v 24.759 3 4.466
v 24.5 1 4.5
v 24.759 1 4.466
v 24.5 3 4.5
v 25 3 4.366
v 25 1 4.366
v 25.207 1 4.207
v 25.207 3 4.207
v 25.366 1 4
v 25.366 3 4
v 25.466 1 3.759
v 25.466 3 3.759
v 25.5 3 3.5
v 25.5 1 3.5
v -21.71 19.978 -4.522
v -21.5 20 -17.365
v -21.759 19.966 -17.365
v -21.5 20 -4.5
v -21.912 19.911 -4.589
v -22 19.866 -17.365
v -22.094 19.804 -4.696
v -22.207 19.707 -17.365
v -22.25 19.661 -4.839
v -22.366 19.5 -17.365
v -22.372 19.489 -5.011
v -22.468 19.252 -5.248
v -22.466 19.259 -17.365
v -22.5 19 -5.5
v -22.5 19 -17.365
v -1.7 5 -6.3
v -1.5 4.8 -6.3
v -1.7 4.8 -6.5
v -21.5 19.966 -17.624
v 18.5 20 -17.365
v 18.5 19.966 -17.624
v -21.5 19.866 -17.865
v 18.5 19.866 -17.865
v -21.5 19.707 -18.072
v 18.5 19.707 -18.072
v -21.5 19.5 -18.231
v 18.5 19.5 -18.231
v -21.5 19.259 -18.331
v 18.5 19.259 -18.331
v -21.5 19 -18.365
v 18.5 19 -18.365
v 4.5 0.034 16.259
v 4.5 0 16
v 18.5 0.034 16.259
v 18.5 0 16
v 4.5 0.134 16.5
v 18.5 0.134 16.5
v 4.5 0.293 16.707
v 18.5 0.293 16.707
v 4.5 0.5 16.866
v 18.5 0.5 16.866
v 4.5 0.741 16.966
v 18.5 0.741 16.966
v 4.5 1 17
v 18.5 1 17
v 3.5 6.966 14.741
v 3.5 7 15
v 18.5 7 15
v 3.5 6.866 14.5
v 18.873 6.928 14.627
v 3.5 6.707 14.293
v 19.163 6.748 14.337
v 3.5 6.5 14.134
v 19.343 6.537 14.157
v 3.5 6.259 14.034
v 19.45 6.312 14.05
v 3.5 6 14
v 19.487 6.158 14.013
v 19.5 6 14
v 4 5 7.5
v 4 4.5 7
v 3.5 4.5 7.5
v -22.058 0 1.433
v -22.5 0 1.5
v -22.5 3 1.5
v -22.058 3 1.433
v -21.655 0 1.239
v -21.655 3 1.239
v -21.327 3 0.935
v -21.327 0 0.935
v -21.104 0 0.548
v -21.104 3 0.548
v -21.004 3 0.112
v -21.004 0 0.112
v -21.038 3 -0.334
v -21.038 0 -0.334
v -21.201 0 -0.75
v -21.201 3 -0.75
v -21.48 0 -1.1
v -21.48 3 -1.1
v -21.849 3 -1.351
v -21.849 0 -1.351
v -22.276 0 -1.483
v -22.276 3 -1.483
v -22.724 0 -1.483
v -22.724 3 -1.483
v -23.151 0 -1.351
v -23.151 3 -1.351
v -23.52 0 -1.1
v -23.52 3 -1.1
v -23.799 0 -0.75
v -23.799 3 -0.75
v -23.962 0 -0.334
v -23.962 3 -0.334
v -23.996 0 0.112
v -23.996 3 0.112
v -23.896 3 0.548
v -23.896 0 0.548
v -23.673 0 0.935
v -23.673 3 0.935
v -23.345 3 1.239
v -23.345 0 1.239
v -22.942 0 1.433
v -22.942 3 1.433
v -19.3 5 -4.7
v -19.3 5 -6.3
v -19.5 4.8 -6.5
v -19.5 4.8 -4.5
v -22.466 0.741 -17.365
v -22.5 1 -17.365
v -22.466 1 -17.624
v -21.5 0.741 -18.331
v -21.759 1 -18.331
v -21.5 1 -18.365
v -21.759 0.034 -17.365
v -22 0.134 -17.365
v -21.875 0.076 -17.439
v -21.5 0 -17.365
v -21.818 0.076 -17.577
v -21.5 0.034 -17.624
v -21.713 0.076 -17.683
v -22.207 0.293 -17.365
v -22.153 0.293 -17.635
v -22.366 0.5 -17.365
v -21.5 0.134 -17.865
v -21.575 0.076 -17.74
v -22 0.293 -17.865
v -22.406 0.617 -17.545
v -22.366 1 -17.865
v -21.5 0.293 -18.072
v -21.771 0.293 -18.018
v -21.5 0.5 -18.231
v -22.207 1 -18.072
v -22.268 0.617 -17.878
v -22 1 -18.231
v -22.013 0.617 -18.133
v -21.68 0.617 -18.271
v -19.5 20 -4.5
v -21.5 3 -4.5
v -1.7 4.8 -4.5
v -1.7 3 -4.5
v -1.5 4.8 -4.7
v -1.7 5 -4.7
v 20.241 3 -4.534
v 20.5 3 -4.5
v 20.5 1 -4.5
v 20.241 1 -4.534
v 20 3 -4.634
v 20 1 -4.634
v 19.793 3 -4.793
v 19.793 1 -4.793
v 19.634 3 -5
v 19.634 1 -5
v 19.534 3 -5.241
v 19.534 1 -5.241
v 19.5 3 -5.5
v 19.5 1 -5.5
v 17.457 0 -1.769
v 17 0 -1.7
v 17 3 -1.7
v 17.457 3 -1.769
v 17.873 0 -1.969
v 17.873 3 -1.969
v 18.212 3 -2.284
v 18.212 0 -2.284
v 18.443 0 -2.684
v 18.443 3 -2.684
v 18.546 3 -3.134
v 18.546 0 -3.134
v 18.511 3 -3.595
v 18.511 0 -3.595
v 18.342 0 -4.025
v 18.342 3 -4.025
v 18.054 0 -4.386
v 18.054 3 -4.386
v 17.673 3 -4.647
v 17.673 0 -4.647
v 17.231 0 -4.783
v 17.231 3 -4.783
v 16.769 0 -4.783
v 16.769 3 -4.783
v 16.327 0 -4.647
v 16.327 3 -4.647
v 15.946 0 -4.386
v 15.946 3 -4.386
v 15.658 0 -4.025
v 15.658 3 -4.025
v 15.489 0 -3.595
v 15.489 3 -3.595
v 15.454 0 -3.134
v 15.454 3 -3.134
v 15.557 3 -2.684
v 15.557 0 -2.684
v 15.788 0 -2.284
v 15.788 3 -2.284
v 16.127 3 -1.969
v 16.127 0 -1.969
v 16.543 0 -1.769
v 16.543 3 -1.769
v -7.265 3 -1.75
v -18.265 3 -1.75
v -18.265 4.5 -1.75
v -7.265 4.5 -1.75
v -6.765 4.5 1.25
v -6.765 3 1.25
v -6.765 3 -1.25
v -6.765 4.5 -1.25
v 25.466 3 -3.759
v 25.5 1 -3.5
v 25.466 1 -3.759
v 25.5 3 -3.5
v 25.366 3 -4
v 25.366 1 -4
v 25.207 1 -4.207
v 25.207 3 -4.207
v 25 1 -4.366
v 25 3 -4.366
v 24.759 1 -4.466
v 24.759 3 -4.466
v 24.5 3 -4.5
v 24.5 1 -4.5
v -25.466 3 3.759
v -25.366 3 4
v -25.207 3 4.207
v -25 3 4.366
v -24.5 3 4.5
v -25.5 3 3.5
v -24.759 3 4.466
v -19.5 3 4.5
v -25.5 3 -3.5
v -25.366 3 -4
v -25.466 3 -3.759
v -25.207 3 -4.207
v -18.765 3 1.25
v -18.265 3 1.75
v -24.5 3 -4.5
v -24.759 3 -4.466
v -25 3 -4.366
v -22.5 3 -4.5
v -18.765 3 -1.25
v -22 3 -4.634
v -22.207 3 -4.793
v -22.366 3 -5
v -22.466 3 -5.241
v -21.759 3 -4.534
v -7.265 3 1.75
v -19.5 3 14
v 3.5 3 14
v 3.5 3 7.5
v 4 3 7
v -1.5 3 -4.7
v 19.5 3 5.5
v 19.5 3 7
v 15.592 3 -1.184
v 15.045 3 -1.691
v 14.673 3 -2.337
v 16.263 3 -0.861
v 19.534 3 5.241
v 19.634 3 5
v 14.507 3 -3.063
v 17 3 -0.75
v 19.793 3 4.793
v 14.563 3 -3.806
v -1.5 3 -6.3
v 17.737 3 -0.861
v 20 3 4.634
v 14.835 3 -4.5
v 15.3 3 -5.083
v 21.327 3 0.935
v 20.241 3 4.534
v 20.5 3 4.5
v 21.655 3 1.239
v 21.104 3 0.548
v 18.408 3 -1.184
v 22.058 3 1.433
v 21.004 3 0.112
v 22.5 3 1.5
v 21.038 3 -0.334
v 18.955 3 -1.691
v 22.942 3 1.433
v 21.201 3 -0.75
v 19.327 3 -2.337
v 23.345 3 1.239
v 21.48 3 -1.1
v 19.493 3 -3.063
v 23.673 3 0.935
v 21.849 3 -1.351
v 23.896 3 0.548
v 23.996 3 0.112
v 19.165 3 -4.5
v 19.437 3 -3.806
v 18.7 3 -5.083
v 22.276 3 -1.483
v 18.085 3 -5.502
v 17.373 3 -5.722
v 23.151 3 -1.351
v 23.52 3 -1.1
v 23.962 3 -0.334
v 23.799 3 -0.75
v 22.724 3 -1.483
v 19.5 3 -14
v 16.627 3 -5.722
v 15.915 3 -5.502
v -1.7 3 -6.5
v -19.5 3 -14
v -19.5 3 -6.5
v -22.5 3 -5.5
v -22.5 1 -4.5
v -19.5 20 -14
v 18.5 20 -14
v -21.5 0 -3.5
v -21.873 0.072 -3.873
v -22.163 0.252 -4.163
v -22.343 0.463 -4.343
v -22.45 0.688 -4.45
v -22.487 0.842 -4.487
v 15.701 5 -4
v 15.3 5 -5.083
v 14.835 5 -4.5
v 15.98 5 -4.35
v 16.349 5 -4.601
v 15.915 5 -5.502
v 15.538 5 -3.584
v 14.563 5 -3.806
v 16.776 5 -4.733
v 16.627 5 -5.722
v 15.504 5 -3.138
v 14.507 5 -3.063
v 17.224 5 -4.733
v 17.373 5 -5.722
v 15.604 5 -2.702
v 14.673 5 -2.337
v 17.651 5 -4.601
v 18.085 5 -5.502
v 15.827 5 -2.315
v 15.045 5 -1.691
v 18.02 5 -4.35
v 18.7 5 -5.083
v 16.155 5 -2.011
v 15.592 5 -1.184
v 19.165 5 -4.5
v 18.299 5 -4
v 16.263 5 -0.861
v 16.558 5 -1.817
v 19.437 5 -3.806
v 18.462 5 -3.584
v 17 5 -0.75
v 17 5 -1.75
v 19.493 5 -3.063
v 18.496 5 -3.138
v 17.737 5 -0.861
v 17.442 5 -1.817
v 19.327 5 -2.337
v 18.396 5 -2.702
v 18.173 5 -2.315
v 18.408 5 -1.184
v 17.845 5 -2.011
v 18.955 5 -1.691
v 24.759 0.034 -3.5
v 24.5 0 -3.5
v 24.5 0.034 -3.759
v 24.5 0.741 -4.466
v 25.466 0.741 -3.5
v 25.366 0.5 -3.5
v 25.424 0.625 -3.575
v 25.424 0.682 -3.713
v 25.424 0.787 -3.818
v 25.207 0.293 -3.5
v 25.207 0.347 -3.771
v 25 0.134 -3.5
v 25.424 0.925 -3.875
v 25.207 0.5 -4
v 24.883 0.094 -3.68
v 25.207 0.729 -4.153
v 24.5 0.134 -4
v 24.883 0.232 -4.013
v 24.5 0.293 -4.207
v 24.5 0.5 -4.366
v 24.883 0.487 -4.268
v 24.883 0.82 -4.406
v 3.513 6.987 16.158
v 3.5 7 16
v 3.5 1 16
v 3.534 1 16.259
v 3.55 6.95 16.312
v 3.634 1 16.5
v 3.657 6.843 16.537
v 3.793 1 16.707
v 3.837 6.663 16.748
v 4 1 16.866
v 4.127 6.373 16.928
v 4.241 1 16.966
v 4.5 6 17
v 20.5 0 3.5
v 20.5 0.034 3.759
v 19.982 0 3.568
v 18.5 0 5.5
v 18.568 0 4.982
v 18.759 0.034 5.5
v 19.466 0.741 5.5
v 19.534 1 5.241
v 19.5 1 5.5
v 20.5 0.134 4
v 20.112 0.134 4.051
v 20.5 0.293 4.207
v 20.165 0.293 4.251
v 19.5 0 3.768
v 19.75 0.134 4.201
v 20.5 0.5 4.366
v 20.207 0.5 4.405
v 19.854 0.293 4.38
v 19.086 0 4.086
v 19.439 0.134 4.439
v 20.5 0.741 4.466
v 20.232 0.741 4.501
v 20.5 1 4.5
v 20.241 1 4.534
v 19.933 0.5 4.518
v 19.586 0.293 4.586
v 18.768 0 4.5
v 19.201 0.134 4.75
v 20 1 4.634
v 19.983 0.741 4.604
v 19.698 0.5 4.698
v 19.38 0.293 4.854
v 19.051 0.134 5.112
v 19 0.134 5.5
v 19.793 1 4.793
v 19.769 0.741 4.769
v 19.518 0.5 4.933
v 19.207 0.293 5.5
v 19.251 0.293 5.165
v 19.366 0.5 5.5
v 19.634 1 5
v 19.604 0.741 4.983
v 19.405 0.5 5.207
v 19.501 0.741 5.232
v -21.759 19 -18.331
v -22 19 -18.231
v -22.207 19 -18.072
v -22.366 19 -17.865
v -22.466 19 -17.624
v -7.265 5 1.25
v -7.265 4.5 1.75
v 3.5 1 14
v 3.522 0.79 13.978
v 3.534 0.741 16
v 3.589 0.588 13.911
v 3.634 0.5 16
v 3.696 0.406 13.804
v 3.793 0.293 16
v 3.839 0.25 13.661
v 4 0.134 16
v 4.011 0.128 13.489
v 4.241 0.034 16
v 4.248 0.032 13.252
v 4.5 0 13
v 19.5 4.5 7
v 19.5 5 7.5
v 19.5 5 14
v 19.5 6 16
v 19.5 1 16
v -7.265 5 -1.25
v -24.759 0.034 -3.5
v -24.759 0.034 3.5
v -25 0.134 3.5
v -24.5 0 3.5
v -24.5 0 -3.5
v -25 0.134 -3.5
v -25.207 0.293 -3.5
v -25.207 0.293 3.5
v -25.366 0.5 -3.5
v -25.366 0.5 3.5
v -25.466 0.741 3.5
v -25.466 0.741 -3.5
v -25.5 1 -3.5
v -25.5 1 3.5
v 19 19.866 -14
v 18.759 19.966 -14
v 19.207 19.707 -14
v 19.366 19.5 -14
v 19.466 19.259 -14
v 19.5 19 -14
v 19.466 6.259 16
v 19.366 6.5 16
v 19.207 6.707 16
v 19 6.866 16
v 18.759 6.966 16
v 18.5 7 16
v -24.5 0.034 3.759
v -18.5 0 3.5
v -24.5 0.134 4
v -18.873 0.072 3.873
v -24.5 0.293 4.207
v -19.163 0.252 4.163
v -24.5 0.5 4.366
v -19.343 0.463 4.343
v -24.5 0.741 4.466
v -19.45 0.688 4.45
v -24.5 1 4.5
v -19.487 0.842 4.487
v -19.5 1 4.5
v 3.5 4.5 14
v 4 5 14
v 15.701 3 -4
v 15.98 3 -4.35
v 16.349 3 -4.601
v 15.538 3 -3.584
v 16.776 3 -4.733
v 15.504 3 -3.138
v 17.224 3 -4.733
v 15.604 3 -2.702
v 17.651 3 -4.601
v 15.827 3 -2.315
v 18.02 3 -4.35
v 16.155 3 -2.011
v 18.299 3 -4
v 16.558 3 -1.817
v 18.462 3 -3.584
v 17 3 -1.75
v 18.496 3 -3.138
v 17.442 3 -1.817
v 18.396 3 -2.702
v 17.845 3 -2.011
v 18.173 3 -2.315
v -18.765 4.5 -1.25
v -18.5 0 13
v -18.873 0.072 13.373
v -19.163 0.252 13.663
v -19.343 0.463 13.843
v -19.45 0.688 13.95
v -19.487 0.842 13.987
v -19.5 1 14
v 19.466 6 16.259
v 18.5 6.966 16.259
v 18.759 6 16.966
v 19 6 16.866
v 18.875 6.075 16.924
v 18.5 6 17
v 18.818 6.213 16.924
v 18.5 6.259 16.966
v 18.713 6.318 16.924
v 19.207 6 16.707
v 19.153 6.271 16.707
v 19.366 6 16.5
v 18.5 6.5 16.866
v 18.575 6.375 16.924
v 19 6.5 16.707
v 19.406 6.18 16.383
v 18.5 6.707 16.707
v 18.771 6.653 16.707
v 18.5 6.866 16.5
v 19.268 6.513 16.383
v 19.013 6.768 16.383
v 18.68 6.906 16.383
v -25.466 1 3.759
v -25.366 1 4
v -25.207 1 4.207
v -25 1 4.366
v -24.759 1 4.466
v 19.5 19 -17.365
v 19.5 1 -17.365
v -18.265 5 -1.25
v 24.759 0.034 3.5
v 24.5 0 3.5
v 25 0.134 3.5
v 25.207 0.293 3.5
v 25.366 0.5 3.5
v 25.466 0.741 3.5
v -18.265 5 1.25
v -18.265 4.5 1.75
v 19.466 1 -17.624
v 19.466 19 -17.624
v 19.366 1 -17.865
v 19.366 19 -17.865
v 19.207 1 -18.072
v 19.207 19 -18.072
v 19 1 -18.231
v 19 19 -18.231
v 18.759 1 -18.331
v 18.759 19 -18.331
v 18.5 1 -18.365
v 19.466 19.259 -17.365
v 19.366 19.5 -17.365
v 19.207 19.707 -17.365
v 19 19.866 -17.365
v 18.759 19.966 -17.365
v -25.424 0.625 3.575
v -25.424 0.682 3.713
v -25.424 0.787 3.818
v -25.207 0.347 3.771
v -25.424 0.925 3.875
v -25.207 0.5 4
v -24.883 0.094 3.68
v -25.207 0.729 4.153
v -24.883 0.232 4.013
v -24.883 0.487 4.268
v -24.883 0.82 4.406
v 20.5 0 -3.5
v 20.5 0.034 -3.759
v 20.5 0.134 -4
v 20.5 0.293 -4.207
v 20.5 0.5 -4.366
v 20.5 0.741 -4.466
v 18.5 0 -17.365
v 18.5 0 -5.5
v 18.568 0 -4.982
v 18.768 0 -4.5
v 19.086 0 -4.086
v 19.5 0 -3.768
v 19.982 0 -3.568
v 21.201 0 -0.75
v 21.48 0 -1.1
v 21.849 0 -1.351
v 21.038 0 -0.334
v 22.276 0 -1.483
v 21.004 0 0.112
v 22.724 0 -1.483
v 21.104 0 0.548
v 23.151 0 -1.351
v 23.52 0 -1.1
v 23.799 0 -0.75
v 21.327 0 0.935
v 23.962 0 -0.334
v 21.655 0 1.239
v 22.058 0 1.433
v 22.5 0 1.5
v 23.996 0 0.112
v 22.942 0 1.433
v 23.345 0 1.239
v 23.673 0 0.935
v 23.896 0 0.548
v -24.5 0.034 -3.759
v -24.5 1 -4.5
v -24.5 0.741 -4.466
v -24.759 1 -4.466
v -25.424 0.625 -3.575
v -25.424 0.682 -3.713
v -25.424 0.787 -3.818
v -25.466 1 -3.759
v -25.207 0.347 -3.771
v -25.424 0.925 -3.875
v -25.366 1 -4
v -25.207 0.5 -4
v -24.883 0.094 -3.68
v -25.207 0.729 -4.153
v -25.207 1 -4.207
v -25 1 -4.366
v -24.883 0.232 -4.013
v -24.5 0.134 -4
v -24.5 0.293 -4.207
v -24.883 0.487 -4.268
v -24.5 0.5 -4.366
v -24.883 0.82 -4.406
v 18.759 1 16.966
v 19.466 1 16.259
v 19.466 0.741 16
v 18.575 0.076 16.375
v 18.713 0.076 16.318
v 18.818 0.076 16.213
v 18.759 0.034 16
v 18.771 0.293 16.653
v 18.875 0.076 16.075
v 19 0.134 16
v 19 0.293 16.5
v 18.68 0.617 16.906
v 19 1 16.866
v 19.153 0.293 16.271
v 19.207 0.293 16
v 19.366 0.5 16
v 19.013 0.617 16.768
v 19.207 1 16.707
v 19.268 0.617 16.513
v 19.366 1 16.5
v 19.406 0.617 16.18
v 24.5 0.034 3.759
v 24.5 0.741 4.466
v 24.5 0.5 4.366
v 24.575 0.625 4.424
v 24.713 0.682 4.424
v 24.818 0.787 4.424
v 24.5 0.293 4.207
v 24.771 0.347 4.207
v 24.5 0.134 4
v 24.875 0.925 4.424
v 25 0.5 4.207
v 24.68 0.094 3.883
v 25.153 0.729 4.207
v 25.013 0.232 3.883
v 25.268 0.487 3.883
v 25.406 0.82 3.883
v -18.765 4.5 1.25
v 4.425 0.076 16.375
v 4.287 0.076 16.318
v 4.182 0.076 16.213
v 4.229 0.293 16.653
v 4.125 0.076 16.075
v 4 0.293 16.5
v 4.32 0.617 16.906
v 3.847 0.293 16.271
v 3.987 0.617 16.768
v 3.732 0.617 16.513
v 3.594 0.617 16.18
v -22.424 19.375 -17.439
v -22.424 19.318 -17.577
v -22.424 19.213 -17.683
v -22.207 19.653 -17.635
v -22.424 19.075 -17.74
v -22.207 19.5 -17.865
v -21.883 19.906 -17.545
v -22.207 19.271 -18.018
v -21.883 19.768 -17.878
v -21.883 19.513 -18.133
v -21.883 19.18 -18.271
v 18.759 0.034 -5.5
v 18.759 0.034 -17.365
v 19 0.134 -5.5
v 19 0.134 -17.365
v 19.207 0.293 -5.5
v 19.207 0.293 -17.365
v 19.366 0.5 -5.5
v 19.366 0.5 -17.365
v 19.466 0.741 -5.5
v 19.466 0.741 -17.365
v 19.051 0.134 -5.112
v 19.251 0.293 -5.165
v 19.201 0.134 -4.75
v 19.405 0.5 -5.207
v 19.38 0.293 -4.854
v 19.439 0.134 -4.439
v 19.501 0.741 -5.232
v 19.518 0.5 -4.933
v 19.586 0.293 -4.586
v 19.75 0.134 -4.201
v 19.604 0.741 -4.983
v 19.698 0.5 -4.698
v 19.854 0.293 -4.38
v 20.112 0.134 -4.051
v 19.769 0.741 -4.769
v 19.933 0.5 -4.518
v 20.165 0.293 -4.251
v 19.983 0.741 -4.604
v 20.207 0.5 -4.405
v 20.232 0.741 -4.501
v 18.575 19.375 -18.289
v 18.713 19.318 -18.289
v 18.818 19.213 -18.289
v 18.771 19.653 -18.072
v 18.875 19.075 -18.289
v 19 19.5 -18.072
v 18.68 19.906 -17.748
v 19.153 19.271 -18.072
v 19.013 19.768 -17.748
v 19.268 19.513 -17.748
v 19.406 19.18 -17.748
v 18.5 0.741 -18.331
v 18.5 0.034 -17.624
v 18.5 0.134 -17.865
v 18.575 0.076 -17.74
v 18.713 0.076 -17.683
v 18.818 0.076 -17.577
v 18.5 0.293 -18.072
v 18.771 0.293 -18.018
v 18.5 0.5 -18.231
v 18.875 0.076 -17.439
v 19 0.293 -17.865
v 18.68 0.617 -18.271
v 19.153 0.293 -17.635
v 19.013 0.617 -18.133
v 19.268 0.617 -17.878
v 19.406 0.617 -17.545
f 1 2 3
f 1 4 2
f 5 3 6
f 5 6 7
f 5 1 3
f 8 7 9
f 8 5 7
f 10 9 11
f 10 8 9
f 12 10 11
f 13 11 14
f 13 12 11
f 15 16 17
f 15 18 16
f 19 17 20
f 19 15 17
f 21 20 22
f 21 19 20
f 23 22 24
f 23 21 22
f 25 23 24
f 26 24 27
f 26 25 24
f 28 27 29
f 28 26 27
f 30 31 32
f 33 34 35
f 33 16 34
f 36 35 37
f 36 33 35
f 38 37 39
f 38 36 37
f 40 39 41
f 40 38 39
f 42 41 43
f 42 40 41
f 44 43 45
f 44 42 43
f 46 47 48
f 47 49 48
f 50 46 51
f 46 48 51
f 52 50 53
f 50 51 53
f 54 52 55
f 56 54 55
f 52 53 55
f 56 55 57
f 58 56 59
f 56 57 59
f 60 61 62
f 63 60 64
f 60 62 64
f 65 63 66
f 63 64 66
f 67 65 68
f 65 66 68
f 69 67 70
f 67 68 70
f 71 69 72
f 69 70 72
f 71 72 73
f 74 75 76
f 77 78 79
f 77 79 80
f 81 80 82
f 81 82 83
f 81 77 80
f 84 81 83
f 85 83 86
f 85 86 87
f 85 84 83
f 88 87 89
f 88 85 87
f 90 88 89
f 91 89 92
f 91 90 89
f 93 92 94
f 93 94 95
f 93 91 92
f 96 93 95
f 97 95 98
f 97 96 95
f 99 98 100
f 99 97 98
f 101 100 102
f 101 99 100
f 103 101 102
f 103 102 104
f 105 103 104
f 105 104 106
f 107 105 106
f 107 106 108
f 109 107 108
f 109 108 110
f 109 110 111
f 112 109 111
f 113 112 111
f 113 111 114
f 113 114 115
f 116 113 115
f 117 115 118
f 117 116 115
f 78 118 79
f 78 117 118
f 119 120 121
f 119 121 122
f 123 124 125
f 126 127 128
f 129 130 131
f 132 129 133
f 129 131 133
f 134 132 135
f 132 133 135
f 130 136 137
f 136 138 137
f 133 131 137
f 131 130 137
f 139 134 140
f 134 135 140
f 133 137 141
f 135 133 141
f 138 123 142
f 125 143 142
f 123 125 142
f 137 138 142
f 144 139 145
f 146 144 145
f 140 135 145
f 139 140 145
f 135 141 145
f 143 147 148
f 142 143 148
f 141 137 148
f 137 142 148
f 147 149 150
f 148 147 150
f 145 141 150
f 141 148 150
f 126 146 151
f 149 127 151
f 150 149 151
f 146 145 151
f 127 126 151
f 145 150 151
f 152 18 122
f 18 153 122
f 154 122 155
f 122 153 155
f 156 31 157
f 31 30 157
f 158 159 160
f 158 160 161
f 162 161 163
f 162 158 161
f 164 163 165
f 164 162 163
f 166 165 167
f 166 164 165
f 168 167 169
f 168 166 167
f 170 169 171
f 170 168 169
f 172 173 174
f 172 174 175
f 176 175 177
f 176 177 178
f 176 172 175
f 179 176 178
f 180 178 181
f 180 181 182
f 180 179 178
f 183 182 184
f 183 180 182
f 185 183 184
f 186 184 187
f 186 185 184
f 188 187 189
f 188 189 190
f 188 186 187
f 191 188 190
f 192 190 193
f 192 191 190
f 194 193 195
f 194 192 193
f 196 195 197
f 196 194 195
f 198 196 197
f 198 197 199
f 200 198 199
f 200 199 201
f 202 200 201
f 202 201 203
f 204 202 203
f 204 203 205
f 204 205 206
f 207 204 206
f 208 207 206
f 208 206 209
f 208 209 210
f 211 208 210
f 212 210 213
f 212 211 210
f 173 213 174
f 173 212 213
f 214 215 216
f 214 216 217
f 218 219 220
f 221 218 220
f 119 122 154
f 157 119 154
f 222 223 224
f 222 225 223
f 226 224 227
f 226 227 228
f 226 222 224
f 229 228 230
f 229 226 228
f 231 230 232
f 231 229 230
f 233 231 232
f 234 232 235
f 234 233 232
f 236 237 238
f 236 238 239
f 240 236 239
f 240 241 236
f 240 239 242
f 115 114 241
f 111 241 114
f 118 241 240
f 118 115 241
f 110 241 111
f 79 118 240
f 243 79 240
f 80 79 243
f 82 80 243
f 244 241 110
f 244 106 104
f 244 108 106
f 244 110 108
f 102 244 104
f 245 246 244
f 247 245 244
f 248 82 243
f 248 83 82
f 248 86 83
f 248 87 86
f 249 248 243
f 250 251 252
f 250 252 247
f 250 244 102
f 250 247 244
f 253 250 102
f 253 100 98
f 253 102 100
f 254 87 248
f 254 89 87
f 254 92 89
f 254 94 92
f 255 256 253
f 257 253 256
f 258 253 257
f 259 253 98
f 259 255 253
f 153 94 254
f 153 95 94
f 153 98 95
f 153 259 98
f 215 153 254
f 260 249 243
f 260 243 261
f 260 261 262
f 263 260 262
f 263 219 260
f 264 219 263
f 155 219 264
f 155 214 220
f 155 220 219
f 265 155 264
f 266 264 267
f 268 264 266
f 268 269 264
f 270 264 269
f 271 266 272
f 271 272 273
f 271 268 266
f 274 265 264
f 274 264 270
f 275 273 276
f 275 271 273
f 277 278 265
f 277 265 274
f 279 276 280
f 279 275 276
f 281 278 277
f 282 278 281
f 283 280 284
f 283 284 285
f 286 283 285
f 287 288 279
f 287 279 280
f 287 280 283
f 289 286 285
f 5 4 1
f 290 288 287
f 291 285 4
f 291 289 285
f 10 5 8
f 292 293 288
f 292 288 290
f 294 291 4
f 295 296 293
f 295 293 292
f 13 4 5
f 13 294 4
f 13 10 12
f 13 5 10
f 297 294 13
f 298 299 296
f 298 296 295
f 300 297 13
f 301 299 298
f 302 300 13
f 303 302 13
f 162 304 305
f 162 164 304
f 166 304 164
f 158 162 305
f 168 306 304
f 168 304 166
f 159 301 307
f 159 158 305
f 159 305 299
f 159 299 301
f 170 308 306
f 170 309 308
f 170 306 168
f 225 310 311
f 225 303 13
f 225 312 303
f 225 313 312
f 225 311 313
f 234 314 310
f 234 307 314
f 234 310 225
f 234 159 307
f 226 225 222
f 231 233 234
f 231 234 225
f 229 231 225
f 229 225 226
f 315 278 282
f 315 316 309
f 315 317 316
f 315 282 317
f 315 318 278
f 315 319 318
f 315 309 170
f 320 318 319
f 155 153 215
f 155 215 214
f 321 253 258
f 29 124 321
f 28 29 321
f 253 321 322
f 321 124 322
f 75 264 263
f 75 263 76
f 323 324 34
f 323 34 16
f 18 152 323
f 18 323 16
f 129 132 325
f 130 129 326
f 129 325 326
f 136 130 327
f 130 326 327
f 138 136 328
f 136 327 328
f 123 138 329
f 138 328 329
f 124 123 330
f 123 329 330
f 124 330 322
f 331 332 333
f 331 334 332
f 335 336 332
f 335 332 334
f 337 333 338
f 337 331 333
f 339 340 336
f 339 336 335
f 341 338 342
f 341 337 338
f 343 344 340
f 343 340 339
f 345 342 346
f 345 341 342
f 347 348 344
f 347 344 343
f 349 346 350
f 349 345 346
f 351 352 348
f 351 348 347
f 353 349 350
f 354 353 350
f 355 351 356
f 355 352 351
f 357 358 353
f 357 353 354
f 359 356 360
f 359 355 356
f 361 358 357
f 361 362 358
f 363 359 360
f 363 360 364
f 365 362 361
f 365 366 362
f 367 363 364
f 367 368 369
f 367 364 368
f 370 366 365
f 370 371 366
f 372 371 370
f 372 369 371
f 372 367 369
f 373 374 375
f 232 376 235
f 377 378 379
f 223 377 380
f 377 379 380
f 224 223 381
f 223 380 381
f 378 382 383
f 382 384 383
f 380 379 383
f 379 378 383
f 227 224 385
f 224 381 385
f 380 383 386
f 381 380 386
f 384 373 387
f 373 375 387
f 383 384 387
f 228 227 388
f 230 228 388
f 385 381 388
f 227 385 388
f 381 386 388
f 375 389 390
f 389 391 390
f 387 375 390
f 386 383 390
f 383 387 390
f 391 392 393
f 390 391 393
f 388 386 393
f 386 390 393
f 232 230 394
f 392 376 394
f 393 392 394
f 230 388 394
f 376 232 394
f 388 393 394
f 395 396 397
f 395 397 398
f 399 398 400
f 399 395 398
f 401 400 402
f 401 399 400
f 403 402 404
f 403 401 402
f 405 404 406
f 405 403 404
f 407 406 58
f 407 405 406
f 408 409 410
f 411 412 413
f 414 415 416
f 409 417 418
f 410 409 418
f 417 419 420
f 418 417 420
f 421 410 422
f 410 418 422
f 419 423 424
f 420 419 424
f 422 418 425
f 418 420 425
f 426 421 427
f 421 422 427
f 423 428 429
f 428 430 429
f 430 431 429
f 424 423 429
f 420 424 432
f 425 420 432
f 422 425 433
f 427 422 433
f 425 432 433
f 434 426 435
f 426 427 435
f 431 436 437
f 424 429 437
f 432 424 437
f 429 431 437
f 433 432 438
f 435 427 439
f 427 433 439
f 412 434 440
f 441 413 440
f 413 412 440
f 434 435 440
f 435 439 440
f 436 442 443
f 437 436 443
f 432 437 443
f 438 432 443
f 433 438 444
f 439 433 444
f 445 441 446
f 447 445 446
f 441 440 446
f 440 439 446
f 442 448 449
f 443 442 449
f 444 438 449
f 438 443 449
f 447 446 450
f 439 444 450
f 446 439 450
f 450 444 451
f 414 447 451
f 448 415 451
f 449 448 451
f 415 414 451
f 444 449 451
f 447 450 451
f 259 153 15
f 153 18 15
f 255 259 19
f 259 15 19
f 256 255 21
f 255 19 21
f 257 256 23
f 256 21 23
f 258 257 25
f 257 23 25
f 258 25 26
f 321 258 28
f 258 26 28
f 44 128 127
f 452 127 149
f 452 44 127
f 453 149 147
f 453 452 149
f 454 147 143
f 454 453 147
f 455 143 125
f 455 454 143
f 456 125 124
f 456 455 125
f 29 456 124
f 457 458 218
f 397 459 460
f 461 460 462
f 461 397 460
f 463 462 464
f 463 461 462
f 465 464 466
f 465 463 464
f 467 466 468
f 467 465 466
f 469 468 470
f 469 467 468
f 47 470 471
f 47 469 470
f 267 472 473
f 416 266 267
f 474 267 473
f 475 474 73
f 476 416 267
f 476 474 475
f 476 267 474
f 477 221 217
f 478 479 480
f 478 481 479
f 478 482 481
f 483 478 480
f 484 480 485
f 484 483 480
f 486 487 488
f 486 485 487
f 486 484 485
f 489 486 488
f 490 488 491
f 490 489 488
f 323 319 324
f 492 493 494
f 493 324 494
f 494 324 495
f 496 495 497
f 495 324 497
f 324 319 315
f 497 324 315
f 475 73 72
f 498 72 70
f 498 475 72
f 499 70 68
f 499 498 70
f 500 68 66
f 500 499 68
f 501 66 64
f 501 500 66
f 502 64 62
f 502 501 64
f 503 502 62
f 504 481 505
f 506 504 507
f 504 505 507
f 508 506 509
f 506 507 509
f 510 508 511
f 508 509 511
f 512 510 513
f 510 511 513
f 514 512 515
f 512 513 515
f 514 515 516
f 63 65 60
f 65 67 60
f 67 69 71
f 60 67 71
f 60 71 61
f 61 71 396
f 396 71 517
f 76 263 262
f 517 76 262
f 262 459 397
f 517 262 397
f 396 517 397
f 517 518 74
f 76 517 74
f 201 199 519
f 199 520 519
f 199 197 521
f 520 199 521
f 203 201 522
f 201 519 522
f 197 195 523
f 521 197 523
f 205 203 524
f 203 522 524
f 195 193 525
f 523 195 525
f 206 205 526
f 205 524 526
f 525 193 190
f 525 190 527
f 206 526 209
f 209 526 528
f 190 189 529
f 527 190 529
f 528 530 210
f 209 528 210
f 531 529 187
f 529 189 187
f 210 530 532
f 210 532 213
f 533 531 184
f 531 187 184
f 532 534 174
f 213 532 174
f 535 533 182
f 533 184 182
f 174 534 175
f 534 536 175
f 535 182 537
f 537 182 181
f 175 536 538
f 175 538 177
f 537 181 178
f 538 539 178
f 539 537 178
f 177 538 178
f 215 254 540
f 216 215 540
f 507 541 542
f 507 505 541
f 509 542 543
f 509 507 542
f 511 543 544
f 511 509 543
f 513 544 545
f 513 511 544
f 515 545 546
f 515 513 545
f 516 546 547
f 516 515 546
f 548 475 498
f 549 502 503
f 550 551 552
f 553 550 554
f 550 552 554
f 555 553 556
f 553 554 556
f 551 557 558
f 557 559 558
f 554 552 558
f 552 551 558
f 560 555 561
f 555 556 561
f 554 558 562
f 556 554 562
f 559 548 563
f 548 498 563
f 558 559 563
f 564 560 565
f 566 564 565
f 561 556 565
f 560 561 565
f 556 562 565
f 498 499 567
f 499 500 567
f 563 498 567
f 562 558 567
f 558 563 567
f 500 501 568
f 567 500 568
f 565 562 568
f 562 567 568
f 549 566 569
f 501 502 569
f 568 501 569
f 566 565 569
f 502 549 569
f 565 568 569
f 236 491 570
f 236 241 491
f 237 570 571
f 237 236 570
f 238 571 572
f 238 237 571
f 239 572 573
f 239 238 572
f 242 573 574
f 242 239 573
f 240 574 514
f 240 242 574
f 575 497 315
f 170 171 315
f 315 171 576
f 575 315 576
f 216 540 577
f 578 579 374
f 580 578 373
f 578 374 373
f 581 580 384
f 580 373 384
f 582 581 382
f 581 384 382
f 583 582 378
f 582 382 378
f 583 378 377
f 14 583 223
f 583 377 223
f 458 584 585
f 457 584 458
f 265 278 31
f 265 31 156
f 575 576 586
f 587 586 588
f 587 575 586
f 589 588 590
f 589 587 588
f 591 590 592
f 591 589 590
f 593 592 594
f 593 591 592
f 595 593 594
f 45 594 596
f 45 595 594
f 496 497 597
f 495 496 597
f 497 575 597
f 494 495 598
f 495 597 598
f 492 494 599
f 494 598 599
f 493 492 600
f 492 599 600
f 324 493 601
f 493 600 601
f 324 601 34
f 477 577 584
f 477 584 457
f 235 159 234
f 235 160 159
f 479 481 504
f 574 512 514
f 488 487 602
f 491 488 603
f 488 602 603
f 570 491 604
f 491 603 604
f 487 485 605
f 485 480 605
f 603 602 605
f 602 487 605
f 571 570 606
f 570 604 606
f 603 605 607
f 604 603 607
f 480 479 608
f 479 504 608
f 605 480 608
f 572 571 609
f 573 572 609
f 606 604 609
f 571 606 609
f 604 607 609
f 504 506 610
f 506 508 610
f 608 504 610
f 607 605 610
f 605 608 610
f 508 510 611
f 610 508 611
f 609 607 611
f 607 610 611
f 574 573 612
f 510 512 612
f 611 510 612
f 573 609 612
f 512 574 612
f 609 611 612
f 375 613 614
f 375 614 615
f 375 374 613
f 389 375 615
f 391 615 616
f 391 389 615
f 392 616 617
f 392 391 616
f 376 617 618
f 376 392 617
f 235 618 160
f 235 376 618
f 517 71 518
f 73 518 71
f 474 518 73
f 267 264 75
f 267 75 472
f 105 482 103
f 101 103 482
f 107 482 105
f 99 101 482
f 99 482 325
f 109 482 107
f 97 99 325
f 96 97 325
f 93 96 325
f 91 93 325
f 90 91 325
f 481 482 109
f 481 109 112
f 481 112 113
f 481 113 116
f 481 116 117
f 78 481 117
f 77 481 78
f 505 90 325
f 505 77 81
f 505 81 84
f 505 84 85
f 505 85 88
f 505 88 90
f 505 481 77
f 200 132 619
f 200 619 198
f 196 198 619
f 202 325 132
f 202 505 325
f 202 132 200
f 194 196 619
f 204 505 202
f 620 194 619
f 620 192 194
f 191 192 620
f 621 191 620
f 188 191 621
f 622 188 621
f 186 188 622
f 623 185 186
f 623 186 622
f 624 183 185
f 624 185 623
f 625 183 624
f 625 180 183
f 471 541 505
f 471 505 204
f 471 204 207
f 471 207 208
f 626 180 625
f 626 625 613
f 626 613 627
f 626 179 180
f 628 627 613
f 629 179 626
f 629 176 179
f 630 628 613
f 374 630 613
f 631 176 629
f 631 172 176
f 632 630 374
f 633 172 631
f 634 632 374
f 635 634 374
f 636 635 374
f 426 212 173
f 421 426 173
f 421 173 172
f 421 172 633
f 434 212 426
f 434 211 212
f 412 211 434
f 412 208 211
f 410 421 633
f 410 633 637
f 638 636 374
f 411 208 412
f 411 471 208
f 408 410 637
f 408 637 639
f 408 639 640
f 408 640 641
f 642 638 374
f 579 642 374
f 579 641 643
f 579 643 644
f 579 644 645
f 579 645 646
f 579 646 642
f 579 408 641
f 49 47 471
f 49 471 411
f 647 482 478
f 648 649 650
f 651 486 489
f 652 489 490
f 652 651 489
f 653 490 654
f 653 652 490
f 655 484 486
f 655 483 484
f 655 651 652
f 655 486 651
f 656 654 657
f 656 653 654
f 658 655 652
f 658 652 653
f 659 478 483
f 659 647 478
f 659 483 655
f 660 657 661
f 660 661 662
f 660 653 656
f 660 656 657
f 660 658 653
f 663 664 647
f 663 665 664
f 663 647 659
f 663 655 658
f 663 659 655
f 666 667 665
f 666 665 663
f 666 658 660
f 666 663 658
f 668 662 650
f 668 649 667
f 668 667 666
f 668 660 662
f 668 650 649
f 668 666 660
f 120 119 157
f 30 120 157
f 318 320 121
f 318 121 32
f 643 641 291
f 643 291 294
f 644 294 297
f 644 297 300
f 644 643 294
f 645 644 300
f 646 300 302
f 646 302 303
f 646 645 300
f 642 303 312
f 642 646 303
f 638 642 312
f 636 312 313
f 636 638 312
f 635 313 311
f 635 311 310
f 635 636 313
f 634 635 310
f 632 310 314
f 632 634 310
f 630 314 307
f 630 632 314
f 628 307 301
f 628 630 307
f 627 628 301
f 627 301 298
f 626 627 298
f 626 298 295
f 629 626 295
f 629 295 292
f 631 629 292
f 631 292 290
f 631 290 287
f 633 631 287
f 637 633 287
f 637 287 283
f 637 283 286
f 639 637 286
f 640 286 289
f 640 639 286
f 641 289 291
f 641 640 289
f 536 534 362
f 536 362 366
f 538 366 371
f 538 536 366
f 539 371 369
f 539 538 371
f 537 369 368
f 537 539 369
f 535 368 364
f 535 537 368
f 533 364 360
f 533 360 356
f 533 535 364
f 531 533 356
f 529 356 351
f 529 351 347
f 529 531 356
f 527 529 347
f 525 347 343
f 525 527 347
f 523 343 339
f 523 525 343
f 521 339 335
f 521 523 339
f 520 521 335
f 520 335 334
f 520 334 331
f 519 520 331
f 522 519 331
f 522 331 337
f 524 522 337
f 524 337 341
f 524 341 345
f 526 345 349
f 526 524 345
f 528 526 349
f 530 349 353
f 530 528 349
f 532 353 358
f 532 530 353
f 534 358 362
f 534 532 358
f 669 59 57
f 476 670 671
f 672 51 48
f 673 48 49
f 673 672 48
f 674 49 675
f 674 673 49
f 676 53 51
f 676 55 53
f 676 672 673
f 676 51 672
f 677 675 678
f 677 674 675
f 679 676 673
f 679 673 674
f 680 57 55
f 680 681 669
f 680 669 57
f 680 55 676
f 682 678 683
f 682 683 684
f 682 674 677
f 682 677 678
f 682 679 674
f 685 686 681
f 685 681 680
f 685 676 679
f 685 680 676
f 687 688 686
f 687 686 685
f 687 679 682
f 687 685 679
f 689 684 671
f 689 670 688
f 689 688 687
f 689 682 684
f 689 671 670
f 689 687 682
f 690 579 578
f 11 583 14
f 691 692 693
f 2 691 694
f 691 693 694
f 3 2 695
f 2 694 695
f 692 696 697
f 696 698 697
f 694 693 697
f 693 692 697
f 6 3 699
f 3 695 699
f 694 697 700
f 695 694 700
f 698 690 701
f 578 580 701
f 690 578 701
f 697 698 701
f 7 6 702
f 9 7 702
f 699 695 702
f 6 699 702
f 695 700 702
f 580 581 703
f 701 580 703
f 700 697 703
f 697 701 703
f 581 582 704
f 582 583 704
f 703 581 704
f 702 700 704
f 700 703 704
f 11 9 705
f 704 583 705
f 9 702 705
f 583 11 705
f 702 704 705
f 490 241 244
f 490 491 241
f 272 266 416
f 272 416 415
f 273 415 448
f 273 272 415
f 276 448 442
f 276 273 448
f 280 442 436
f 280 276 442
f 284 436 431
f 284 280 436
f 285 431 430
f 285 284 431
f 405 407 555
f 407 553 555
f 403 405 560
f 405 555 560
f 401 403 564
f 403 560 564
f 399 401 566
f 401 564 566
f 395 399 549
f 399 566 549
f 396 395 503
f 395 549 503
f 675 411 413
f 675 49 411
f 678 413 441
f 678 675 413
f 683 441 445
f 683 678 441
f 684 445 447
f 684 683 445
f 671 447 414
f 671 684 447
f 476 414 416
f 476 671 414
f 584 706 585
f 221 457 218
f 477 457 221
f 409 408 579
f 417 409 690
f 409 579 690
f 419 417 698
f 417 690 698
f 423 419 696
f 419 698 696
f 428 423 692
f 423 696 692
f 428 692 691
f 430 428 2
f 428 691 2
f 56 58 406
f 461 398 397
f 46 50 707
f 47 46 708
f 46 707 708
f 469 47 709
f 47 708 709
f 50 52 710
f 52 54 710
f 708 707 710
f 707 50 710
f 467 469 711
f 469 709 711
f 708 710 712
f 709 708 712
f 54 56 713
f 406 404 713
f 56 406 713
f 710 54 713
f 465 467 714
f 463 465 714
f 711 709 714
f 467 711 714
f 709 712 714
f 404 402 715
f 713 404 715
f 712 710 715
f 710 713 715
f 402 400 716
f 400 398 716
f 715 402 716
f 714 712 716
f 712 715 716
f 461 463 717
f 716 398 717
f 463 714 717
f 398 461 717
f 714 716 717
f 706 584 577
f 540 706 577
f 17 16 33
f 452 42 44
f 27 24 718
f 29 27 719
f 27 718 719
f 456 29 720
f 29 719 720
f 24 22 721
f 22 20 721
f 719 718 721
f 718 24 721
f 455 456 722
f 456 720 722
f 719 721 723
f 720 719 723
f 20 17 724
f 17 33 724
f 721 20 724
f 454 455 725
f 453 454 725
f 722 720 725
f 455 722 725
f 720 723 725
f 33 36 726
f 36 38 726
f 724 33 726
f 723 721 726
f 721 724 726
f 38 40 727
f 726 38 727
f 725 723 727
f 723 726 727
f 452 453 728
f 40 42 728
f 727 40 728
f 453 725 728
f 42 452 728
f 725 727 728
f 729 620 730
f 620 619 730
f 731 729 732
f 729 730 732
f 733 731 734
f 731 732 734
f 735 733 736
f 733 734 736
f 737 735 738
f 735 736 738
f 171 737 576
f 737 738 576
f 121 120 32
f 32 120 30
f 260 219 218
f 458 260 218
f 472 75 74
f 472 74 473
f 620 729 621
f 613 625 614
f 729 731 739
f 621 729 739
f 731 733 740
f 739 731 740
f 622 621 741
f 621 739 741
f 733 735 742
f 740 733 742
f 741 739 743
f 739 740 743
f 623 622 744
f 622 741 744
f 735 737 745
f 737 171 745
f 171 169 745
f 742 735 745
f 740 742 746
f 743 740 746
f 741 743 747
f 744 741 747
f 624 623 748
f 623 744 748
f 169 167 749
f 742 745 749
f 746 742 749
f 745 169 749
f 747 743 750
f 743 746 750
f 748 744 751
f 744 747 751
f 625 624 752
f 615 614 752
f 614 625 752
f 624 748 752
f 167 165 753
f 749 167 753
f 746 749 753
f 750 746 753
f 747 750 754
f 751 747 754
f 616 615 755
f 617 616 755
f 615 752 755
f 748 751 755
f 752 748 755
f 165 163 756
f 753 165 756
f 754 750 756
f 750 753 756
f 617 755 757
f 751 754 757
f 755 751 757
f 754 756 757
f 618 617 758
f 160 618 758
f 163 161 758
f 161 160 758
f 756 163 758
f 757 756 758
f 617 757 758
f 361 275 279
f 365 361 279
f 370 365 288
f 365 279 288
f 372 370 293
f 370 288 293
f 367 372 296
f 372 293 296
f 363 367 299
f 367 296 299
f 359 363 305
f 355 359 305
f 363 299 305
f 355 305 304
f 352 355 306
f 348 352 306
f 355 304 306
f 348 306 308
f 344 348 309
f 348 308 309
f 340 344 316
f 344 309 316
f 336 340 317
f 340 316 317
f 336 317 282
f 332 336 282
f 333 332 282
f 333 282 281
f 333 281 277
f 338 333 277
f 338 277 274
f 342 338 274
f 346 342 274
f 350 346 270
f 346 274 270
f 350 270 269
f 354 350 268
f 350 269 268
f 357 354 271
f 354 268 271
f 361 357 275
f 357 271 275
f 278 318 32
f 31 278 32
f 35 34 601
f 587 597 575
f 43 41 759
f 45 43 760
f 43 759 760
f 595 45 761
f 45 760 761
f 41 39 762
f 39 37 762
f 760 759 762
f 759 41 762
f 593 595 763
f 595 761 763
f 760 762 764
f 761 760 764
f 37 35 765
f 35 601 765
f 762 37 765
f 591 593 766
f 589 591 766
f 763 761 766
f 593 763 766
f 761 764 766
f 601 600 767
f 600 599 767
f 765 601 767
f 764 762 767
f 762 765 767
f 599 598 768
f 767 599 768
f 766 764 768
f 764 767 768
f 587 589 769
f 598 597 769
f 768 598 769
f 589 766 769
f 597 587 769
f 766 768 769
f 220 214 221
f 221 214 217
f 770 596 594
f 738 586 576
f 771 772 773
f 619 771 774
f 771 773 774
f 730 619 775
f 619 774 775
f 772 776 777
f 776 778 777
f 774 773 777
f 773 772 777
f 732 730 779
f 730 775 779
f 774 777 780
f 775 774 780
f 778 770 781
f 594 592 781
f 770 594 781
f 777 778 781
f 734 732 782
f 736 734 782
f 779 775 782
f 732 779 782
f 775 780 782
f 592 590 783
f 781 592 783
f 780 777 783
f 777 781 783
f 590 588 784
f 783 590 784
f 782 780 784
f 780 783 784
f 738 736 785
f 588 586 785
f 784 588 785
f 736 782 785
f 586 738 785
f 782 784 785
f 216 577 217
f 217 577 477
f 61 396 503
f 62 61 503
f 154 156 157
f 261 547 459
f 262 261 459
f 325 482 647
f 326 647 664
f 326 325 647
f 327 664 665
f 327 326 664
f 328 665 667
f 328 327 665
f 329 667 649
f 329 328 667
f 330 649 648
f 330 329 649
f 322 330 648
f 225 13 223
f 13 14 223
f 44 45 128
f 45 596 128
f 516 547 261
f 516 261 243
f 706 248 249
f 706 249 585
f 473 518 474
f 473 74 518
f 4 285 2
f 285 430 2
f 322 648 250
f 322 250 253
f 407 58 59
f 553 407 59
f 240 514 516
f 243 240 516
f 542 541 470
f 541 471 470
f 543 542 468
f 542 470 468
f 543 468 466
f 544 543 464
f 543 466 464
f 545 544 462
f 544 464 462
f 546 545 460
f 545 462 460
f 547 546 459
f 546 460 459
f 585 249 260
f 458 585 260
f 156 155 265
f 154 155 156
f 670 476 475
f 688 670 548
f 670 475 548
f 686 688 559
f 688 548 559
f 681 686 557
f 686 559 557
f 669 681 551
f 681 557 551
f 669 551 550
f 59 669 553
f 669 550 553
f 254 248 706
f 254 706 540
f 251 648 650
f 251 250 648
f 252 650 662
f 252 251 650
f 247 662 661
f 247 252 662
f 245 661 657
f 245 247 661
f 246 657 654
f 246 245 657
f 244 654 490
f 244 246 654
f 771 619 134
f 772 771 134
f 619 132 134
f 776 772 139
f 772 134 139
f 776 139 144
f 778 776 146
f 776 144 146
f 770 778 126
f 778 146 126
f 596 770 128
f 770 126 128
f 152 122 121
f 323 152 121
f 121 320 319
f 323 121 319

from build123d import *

# Parameters (mm, degrees)
ESQUISSE1_W         = 6
ESQUISSE1_H         = 9
ESQUISSE1_R         = 1.5
ESQUISSE1_W_2       = 39
ESQUISSE1_H_2       = 28
ESQUISSE1_R_2       = 1.55
BOSS_EXTRU_2_DEPTH  = 3
ESQUISSE2_W         = 12
ESQUISSE2_H         = 3.5
BOSS_EXTRU_3_DEPTH  = 2
CHANFREIN1_SIZE     = 0.5
ESQUISSE7_R         = 2.5
ESQUISSE7_R_2       = 1.5
BOSS_EXTRU_6_DEPTH  = 2
ESQUISSE5_W         = 18
ESQUISSE5_H         = 2
BOSS_EXTRU_7_DEPTH  = 5
CHANFREIN2_SIZE     = 0.2
ESQUISSE8_W         = 16
ESQUISSE8_H         = 7
BOSS_EXTRU_8_DEPTH  = 2
CHANFREIN3_SIZE     = 0.5
BOSS_EXTRU_9_DEPTH  = 20
ESQUISSE11_W        = 16
ESQUISSE11_H        = 3
BOSS_EXTRU_10_DEPTH = 7
CONG_1_R            = 1


with BuildPart() as part:
    # Esquisse1 → Boss.-Extru.2 (new body)
    # profile 1 of 3: a face of its own
    with BuildSketch(Plane(origin=(0, 0, 0), x_dir=(1, 0, 0), z_dir=(0, 1, 0))):
        with Locations((-22.5, 0)):
            Rectangle(ESQUISSE1_W, ESQUISSE1_H)
        with Locations(Location((-22.5, 0, 0), (0, 0, 270))):
            Circle(ESQUISSE1_R, mode=Mode.SUBTRACT)
    # profile 2 of 3: a face of its own
    with BuildSketch(Plane(origin=(0, 0, 0), x_dir=(1, 0, 0), z_dir=(0, 1, 0))):
        Rectangle(ESQUISSE1_W_2, ESQUISSE1_H_2)
        with Locations(Location((17, 3.25, 0), (0, 0, 270))):
            Circle(ESQUISSE1_R_2, mode=Mode.SUBTRACT)
    # profile 3 of 3: a face of its own
    with BuildSketch(Plane(origin=(0, 0, 0), x_dir=(1, 0, 0), z_dir=(0, 1, 0))):
        with Locations((22.5, 0)):
            Rectangle(ESQUISSE1_W, ESQUISSE1_H)
        with Locations(Location((22.5, 0, 0), (0, 0, 270))):
            Circle(ESQUISSE1_R, mode=Mode.SUBTRACT)
    extrude(amount=BOSS_EXTRU_2_DEPTH)

    # Esquisse2 → Boss.-Extru.3 (add)
    with BuildSketch(Plane(origin=(0, 3, 0), x_dir=(1, 0, 0), z_dir=(0, 1, 0))):
        with Locations((-12.765224295, 0)):
            Rectangle(ESQUISSE2_W, ESQUISSE2_H)
    extrude(amount=BOSS_EXTRU_3_DEPTH)

    # Chanfrein1
    chanfrein1_edges = [part.edges().sort_by_distance(p)[0] for p in [
        (-18.765224295, 4, -1.75),
        (-18.765224295, 4, 1.75),
        (-6.765224295, 4, 1.75),
        (-6.765224295, 4, -1.75),
        (-18.765224295, 5, 0),
        (-12.765224295, 5, 1.75),
        (-6.765224295, 5, 0),
        (-12.765224295, 5, -1.75),
    ]]
    chamfer(chanfrein1_edges, length=CHANFREIN1_SIZE)

    # Esquisse7 → Boss.-Extru.6 (add)
    with BuildSketch(Plane(origin=(0, 3, 0), x_dir=(1, 0, 0), z_dir=(0, 1, 0))):
        with Locations(Location((17, 3.25, 0), (0, 0, 270))):
            Circle(ESQUISSE7_R)
        with Locations(Location((17, 3.25, 0), (0, 0, 270))):
            Circle(ESQUISSE7_R_2, mode=Mode.SUBTRACT)
    extrude(amount=BOSS_EXTRU_6_DEPTH)

    # Esquisse5 → Boss.-Extru.7 (add)
    with BuildSketch(Plane.XZ):
        with Locations((-10.5, -5.5)):
            Rectangle(ESQUISSE5_W, ESQUISSE5_H)
    extrude(amount=-BOSS_EXTRU_7_DEPTH)

    # Chanfrein2
    chanfrein2_edges = [part.edges().sort_by_distance(p)[0] for p in [
        (-1.5, 4, -4.5),
        (-1.5, 5, -5.5),
        (-1.5, 4, -6.5),
        (-10.5, 5, -6.5),
        (-19.5, 5, -5.5),
        (-10.5, 5, -4.5),
    ]]
    chamfer(chanfrein2_edges, length=CHANFREIN2_SIZE)

    # Esquisse8 → Boss.-Extru.8 (add)
    with BuildSketch(Plane(origin=(0, 3, 0), x_dir=(1, 0, 0), z_dir=(0, 1, 0))):
        with Locations((11.5, -10.5)):
            Rectangle(ESQUISSE8_W, ESQUISSE8_H)
    extrude(amount=BOSS_EXTRU_8_DEPTH)

    # Chanfrein3
    chanfrein3_edges = [part.edges().sort_by_distance(p)[0] for p in [
        (3.5, 4, 7),
        (11.5, 5, 7),
        (3.5, 5, 10.5),
    ]]
    chamfer(chanfrein3_edges, length=CHANFREIN3_SIZE)

    # Esquisse9 → Boss.-Extru.9 (add)
    with BuildSketch(Plane.XZ):
        Polygon((-19.5, -14), (19.5, -14), (19.5, -18.364828329), (-22.5, -18.364828329), (-22.5, -4.5), (-19.5, -4.5), align=None)
    extrude(amount=-BOSS_EXTRU_9_DEPTH)

    # Esquisse11 → Boss.-Extru.10 (add)
    with BuildSketch(Plane.XZ):
        with Locations((11.5, 15.5)):
            Rectangle(ESQUISSE11_W, ESQUISSE11_H)
    extrude(amount=-BOSS_EXTRU_10_DEPTH)

    # Congé1
    cong_1_edges = [part.edges().sort_by_distance(p)[0] for p in [
        (-24, 0, -4.5),
        (-22.5, 11.5, -4.5),
        (19.5, 20, -16.182414164),
        (-1.5, 20, -18.364828329),
        (19.5, 10, -18.364828329),
        (-22.5, 20, -11.432414164),
        (-22.5, 10, -18.364828329),
        (-22.5, 0, -11.432414164),
        (-1.5, 0, -18.364828329),
        (19.5, 0, -11.432414164),
        (22.5, 0, -4.5),
        (11.5, 7, 14),
        (25.5, 0, 0),
        (19.5, 7, 15.5),
        (19.5, 3.5, 17),
        (11.5, 7, 17),
        (3.5, 3.5, 17),
        (11.5, 0, 17),
        (3.5, 0, 15.5),
        (22.5, 0, 4.5),
        (19.5, 0, 10.75),
        (-8, 0, 14),
        (-19.5, 0, 9.25),
        (-22.5, 0, 4.5),
        (-25.5, 0, 0),
        (-25.5, 1.5, -4.5),
        (19.5, 1.5, -4.5),
        (25.5, 1.5, -4.5),
        (25.5, 1.5, 4.5),
        (19.5, 1.5, 4.5),
        (-25.5, 1.5, 4.5),
    ]]
    fillet(cong_1_edges, radius=CONG_1_R)


solid = part.part
